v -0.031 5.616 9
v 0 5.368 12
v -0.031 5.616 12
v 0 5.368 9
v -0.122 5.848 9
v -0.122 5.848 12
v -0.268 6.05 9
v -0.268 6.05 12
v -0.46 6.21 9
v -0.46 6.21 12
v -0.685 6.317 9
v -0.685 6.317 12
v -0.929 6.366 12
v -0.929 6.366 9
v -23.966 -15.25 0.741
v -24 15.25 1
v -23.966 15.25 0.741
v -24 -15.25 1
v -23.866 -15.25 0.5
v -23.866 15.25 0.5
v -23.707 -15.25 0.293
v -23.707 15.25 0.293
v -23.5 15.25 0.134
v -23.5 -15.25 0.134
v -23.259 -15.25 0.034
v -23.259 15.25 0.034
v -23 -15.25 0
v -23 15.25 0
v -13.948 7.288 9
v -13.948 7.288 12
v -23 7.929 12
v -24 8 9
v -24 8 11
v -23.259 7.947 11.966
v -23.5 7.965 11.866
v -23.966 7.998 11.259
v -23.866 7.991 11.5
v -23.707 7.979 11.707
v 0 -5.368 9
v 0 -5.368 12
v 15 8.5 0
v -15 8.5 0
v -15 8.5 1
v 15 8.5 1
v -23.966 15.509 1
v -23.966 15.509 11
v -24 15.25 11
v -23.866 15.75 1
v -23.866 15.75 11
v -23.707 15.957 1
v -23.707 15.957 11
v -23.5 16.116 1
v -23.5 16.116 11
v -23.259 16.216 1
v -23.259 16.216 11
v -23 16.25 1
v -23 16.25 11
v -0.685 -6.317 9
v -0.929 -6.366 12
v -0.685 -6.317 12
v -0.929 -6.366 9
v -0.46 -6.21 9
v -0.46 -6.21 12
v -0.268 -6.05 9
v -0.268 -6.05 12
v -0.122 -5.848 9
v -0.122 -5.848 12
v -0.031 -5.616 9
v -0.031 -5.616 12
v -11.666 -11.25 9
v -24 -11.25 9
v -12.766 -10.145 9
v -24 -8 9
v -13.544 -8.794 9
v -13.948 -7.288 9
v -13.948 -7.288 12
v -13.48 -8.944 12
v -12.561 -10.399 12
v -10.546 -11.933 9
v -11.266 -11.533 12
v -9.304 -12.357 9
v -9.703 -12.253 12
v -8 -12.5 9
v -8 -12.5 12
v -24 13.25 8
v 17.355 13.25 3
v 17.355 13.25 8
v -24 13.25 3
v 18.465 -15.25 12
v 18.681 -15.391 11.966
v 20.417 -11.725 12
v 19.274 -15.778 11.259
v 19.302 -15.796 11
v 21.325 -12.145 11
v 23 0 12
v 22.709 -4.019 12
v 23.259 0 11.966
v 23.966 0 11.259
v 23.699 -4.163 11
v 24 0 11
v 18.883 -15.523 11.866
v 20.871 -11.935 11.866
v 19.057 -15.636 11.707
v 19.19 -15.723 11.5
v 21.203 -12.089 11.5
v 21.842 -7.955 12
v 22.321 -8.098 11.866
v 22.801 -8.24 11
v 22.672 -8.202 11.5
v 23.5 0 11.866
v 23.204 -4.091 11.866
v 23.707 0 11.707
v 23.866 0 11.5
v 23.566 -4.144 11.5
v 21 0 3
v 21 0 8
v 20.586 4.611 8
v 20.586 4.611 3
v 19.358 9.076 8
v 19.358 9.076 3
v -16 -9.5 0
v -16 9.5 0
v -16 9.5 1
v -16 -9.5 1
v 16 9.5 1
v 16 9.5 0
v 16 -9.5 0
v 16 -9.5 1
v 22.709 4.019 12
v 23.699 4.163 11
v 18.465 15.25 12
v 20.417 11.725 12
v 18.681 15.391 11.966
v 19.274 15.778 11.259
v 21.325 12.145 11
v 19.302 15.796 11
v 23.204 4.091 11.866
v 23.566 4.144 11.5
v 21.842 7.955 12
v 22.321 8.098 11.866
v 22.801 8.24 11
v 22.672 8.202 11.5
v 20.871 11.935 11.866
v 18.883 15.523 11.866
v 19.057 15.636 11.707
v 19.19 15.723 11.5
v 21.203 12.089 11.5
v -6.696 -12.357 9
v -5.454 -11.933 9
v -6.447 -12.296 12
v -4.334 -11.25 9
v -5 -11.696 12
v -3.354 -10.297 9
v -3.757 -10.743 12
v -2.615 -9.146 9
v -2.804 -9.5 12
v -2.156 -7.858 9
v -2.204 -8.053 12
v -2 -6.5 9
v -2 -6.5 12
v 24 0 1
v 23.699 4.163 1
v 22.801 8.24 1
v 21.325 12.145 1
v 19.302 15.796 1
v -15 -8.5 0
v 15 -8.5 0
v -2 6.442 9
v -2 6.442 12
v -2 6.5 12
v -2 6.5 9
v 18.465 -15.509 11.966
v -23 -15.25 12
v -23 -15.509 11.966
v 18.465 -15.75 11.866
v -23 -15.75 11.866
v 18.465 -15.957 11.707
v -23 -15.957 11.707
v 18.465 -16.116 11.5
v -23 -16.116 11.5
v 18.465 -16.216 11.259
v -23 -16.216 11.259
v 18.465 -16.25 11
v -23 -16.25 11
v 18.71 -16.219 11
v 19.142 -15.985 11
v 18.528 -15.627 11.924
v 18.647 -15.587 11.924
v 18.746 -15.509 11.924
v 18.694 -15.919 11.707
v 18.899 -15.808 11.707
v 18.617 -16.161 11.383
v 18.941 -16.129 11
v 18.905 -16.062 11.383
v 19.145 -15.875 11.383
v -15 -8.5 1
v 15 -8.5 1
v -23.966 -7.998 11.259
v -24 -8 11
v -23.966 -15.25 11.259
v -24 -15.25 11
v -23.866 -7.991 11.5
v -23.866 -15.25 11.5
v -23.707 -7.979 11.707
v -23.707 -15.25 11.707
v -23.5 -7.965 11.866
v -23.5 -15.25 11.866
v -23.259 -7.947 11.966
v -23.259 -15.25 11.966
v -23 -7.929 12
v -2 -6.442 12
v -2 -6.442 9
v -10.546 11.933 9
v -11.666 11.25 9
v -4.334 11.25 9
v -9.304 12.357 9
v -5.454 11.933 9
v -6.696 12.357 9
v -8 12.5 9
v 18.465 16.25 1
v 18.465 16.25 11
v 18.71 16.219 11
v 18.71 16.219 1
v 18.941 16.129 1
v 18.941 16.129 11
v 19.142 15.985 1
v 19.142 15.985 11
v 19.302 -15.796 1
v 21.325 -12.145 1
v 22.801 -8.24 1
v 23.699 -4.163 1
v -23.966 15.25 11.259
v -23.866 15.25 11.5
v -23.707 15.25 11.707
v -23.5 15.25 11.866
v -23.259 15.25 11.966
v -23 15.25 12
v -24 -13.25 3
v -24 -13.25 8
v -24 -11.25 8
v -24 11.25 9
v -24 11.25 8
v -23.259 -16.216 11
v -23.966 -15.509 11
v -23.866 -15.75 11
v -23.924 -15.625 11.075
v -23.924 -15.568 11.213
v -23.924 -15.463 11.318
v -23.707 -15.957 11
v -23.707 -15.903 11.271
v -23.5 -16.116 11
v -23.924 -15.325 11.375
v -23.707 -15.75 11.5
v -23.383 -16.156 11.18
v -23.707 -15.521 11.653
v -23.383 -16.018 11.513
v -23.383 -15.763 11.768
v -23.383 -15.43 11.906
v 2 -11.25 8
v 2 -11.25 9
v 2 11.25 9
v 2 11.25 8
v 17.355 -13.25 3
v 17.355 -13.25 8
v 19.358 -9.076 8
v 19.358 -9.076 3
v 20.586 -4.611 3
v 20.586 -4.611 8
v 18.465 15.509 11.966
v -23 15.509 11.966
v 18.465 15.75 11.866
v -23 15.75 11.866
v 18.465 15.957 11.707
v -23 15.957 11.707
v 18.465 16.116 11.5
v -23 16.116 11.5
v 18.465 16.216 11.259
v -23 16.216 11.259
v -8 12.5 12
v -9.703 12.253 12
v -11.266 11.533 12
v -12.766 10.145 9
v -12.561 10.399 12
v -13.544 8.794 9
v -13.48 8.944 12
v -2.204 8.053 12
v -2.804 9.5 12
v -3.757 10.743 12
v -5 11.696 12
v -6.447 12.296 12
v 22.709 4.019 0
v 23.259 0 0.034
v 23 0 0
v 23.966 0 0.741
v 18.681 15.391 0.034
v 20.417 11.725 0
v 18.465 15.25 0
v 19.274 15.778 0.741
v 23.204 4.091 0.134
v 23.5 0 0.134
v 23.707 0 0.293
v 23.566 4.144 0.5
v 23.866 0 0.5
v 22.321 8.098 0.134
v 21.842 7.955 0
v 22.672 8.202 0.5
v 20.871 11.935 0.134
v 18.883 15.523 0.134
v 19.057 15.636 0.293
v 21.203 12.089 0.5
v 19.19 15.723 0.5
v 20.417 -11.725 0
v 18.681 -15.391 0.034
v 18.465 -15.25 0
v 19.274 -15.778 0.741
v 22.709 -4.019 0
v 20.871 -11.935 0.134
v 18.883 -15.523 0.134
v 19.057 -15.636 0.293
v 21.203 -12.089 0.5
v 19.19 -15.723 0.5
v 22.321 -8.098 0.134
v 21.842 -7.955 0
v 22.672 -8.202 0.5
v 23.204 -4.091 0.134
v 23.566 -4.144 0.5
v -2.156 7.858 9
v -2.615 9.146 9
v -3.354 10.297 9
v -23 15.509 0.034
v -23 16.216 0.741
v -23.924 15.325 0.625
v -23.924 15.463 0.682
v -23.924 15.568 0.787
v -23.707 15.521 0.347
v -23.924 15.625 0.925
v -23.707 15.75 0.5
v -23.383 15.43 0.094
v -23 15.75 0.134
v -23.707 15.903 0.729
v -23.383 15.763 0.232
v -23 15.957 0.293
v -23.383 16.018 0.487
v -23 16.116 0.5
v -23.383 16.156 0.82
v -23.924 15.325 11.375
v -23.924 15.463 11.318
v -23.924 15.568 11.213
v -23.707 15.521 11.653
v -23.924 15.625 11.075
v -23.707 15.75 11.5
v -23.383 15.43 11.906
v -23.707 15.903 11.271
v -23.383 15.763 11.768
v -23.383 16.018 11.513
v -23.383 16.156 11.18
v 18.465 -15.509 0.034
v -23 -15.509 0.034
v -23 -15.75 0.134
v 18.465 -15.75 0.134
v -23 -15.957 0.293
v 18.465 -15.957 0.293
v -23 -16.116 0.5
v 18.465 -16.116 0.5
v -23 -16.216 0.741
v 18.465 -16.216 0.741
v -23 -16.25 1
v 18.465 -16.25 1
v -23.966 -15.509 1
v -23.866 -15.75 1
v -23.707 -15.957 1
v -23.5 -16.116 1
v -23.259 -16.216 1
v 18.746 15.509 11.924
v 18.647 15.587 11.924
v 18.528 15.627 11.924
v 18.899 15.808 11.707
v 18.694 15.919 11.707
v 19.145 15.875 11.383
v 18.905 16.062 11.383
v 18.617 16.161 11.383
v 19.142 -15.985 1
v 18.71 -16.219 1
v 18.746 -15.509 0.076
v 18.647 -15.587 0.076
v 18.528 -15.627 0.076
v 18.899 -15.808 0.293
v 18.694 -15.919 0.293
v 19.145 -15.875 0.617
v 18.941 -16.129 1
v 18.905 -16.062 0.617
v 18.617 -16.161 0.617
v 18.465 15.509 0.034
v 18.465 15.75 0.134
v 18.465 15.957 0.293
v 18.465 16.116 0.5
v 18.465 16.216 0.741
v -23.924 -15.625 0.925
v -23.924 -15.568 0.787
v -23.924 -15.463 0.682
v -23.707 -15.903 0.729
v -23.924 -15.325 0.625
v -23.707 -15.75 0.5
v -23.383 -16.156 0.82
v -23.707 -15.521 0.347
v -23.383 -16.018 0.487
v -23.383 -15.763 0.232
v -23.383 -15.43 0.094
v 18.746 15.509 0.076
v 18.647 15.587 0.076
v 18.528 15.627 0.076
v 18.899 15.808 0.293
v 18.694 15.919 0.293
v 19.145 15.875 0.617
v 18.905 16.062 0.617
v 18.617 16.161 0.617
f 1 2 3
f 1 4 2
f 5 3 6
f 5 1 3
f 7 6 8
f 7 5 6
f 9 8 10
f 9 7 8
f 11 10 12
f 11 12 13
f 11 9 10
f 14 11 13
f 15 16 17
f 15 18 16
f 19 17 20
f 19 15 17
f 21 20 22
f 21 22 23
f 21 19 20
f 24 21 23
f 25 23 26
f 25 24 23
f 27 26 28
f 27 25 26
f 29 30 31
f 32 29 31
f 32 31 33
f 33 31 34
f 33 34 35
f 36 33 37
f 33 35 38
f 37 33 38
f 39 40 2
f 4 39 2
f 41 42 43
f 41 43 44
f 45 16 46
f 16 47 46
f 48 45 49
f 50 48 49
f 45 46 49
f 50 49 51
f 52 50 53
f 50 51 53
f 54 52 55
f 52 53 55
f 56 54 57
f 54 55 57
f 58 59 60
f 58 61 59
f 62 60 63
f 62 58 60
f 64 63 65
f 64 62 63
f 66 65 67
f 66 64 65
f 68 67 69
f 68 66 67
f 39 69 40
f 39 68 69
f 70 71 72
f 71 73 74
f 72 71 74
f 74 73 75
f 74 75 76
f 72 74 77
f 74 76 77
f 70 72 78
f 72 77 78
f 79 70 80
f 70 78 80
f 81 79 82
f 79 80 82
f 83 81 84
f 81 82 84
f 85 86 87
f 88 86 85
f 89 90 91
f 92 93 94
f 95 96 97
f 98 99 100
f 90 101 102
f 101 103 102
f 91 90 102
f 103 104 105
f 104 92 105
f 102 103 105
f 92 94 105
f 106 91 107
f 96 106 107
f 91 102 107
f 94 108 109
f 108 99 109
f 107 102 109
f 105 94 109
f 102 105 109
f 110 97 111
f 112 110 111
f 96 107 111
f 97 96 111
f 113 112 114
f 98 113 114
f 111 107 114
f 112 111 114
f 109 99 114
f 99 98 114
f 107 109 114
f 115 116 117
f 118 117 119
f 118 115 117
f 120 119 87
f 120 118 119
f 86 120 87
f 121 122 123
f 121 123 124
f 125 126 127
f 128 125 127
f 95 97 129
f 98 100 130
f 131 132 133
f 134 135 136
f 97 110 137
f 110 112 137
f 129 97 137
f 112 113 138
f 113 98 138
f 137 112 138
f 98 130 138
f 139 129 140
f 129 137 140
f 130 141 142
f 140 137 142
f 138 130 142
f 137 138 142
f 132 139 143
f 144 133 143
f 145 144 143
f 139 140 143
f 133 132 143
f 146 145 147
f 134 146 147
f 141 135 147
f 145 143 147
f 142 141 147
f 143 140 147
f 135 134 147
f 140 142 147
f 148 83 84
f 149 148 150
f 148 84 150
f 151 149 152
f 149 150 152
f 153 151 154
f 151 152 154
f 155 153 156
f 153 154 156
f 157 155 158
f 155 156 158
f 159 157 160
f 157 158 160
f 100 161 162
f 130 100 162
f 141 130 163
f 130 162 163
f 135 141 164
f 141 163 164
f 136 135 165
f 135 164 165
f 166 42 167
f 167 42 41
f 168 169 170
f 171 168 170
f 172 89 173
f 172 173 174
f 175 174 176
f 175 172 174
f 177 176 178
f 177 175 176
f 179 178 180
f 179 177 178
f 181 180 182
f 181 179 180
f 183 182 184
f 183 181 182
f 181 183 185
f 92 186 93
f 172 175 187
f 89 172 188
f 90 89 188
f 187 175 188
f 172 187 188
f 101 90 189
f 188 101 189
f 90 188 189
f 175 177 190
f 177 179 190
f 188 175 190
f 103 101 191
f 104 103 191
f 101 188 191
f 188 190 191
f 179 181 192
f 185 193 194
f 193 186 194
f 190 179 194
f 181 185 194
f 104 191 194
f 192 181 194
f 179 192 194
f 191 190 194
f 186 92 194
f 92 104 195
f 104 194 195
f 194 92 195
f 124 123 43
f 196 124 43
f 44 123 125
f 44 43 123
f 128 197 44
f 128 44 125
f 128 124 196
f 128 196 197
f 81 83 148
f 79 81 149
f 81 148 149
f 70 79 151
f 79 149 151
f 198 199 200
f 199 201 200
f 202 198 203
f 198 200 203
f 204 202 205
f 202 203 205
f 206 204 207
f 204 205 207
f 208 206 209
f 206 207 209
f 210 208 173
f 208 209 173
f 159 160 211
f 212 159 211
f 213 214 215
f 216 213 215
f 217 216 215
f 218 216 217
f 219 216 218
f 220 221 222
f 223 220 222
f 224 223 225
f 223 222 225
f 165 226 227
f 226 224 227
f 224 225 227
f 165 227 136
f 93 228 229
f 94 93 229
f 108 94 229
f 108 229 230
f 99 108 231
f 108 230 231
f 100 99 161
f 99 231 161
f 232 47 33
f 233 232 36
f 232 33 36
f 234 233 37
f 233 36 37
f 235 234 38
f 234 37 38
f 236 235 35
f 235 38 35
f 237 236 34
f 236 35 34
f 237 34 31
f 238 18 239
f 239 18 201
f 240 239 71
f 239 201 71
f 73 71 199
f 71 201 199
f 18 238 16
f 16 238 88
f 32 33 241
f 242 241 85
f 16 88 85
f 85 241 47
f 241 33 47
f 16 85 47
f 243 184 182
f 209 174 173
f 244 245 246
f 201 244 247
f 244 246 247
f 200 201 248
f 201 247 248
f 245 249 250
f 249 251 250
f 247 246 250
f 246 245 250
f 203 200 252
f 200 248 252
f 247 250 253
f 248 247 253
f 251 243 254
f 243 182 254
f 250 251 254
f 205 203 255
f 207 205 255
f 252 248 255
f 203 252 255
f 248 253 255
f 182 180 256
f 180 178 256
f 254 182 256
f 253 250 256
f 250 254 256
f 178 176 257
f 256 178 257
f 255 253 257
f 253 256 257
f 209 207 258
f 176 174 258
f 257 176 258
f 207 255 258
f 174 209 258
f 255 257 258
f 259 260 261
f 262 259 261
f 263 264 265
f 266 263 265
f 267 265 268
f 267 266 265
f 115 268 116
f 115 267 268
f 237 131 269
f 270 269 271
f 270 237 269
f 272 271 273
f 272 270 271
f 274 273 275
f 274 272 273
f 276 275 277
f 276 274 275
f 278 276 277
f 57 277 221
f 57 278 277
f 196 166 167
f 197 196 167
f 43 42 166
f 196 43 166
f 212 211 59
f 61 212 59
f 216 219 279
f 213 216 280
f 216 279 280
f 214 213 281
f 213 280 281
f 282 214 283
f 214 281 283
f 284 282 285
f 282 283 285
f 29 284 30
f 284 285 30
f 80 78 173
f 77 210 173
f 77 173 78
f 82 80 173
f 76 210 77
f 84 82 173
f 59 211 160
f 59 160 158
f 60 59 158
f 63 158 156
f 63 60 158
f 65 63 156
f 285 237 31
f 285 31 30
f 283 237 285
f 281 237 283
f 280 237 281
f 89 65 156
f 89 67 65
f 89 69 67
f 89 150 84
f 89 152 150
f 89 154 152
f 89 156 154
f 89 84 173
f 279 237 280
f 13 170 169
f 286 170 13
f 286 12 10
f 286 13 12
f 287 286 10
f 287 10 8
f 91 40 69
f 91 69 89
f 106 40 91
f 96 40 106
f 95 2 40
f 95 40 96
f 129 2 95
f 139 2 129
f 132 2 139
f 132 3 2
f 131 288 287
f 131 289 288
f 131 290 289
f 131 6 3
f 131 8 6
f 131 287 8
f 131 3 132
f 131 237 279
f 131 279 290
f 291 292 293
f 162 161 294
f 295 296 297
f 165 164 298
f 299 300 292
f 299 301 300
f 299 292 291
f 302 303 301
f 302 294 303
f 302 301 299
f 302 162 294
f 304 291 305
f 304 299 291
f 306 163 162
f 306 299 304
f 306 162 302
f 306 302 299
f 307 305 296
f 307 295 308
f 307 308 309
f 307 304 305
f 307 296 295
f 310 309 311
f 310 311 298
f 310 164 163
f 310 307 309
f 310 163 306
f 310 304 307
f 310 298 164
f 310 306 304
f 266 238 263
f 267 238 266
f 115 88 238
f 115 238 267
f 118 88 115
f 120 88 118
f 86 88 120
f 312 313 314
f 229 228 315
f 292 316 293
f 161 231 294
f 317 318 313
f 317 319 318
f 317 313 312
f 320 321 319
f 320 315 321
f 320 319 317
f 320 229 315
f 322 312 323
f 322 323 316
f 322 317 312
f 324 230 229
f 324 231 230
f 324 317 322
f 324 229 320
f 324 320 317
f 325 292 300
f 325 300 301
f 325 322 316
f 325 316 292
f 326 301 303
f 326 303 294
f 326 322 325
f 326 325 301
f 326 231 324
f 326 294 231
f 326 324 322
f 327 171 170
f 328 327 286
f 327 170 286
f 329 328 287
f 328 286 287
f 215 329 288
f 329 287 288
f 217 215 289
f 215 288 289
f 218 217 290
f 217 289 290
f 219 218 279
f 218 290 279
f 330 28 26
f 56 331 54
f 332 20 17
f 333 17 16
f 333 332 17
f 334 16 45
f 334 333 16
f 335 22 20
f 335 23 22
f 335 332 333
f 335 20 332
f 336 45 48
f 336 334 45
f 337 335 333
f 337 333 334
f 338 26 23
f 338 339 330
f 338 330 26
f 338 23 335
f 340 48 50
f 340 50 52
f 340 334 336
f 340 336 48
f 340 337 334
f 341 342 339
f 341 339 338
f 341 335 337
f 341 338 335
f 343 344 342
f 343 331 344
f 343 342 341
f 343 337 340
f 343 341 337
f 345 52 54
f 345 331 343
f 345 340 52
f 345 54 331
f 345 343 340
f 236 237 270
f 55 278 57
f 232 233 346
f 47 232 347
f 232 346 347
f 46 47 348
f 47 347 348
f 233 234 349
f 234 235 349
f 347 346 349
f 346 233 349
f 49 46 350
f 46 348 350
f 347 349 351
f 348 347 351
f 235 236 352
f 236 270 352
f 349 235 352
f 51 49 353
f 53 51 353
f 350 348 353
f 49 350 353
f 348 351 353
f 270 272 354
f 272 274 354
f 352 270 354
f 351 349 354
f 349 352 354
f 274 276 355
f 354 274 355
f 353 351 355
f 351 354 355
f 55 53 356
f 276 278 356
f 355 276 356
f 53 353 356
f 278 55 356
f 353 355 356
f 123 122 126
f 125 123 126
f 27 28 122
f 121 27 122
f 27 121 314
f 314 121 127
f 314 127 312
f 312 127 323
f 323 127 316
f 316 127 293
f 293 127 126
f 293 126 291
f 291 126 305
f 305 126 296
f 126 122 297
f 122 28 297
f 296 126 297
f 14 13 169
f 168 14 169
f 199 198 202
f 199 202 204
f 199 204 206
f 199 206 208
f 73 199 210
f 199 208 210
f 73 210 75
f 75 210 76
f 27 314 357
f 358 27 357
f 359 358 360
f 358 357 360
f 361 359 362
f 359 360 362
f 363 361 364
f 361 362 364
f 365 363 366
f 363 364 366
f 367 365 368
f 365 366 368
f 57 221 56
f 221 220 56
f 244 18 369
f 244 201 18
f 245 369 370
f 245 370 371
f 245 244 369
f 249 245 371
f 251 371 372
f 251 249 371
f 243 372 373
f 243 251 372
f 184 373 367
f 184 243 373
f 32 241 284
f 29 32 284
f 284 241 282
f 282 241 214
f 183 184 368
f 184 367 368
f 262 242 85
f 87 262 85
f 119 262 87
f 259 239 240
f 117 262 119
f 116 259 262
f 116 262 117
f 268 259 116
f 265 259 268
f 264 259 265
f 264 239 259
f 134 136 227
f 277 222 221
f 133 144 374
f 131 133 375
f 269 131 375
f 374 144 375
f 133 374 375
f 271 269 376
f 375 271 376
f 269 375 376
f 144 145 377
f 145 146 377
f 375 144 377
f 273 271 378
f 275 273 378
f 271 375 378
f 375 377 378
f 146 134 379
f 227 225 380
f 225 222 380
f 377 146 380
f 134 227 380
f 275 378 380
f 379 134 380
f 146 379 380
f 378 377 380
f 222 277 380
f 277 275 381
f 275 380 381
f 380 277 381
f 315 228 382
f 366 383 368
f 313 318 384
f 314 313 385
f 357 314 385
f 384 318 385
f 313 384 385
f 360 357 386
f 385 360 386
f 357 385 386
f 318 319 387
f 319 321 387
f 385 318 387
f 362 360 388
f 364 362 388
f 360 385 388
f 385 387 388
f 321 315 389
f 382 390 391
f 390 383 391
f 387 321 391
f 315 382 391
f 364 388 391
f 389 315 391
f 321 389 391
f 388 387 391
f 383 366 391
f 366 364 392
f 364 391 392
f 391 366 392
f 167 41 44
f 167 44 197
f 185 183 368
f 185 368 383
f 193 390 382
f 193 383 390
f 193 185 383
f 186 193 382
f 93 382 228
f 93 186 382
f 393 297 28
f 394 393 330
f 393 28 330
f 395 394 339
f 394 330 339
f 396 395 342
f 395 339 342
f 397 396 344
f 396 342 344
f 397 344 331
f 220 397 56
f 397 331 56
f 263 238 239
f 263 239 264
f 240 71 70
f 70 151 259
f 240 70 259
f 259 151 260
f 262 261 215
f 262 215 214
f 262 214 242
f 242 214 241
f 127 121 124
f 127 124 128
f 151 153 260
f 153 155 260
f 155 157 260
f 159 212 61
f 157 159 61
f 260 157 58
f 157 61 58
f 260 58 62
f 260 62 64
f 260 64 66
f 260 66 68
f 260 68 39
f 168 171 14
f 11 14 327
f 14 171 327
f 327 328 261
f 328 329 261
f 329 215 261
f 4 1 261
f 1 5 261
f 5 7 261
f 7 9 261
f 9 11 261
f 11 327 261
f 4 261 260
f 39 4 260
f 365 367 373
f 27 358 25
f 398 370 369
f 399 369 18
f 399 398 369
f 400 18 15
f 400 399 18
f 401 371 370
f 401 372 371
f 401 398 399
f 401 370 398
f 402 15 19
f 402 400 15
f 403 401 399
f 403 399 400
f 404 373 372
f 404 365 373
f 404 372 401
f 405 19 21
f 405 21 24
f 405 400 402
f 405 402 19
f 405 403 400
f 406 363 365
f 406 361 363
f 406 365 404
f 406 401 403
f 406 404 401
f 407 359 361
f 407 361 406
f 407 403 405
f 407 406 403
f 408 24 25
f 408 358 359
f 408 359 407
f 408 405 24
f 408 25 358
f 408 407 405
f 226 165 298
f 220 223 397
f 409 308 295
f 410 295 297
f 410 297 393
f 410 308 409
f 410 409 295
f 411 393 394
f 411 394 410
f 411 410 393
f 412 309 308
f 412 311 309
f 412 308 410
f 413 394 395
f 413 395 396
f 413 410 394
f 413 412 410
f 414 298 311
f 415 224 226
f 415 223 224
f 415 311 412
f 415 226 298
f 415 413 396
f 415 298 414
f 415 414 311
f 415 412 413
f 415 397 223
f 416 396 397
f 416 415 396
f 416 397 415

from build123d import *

# Parameters (mm, degrees)
F1_DEPTH = 12
F2_T     = -3
F4_DEPTH = 3
F5_R     = 1
F6_W     = 32
F6_H     = 19
F6_W_2   = 30
F6_H_2   = 17
F7_DEPTH = 1
F9_DEPTH = 1
F10_R    = 1


with BuildPart() as f1:
    # F0 (on Top) → F1 (new body)
    with BuildSketch(Plane.XY):
        with BuildLine():
            Line((-24, -16.25), (19, -16.25))
            ThreePointArc((19, -16.25), (22.7217369359, -8.5009191815), (24, -2.376e-07))
            ThreePointArc((24, -2.376e-07), (22.7217370058, 8.5009189544), (19, 16.25))
            Line((19, 16.25), (-24, 16.25))
            Line((-24, 16.25), (-24, -16.25))
        make_face()
    extrude(amount=F1_DEPTH)

    # F2
    f2_openings = [f1.faces().sort_by_distance(p)[0] for p in [
        (-24, 0, 6),
    ]]
    offset(amount=F2_T, openings=f2_openings)

    # F3 (on face) → F4 (cut, through all)
    with BuildSketch(Plane.XY.offset(12)):
        with BuildLine():
            ThreePointArc((-8, 12.5), (-11.9542437084, 11.0126440912), (-13.9480315021, 7.2879855647))
            Line((-13.9480315021, 7.2879855647), (-2, 6.4416666667))
            Line((-2, 6.4416666667), (-2, 6.5))
            ThreePointArc((-2, 6.5), (-3.7573593129, 10.7426406871), (-8, 12.5))
        make_face()
        with BuildLine():
            Line((-2, 6.4416666667), (-13.9480315021, 7.2879855647))
            ThreePointArc((-13.9480315021, 7.2879855647), (-13.9869937787, 6.8948486973), (-14, 6.5))
            Line((-14, 6.5), (-14, -6.5))
            ThreePointArc((-14, -6.5), (-13.9869937787, -6.8948486973), (-13.9480315021, -7.2879855647))
            Line((-13.9480315021, -7.2879855647), (-2, -6.4416666667))
            Line((-2, -6.4416666667), (-2, 6.4416666667))
        make_face()
        with BuildLine():
            Line((-2, -6.4416666667), (-13.9480315021, -7.2879855647))
            ThreePointArc((-13.9480315021, -7.2879855647), (-11.9542437084, -11.0126440912), (-8, -12.5))
            ThreePointArc((-8, -12.5), (-3.7573593129, -10.7426406871), (-2, -6.5))
            Line((-2, -6.5), (-2, -6.4416666667))
        make_face()
        with BuildLine():
            Line((-13.9480315021, 7.2879855647), (-24, 8))
            Line((-24, 8), (-24, -8))
            Line((-24, -8), (-13.9480315021, -7.2879855647))
            ThreePointArc((-13.9480315021, -7.2879855647), (-13.9869937787, -6.8948486973), (-14, -6.5))
            Line((-14, -6.5), (-14, 6.5))
            ThreePointArc((-14, 6.5), (-13.9869937787, 6.8948486973), (-13.9480315021, 7.2879855647))
        make_face()
        Polygon((0, 6.3), (-2, 6.4416666667), (-2, -6.4416666667), (0, -6.3), (0, 0), align=None)
    extrude(amount=-F4_DEPTH, mode=Mode.SUBTRACT)

    # F5
    f5_edges = [f1.edges().sort_by_distance(p)[0] for p in [
        (0, 6.3, 10.5),
        (0, -6.3, 10.5),
    ]]
    fillet(f5_edges, radius=F5_R)

    # F6 (on face) → F7 (cut)
    with BuildSketch(Plane(origin=(0, 0, 0), x_dir=(1, 0, 0), z_dir=(0, 0, -1))):
        Rectangle(F6_W, F6_H)
        Rectangle(F6_W_2, F6_H_2, mode=Mode.SUBTRACT)
    extrude(amount=-F7_DEPTH, mode=Mode.SUBTRACT)

    # F8 (on face) → F9 (join)
    with BuildSketch(Plane(origin=(0, 0, 9), x_dir=(1, 0, 0), z_dir=(0, 0, -1))):
        with BuildLine():
            ThreePointArc((-4.3342804253, 11.25), (-8, 12.5), (-11.6657195747, 11.25))
            Line((-11.6657195747, 11.25), (-4.3342804253, 11.25))
        make_face()
        with BuildLine():
            Line((-4.3342804253, -11.25), (-11.6657195747, -11.25))
            ThreePointArc((-11.6657195747, -11.25), (-8, -12.5), (-4.3342804253, -11.25))
        make_face()
        with BuildLine():
            Line((-24, -11.25), (-24, -13.25))
            Line((-24, -13.25), (17.355180526, -13.25))
            ThreePointArc((17.355180526, -13.25), (21, 0), (17.355180526, 13.25))
            Line((17.355180526, 13.25), (-24, 13.25))
            Line((-24, 13.25), (-24, 11.25))
            Line((-24, 11.25), (-11.6657195747, 11.25))
            ThreePointArc((-11.6657195747, 11.25), (-8, 12.5), (-4.3342804253, 11.25))
            Line((-4.3342804253, 11.25), (2, 11.25))
            Line((2, 11.25), (2, -11.25))
            Line((2, -11.25), (-4.3342804253, -11.25))
            ThreePointArc((-4.3342804253, -11.25), (-8, -12.5), (-11.6657195747, -11.25))
            Line((-11.6657195747, -11.25), (-24, -11.25))
        make_face()
    extrude(amount=F9_DEPTH)

    # F10
    f10_edges = [f1.edges().sort_by_distance(p)[0] for p in [
        (-2.5, -16.25, 12),
        (24, 0, 12),
        (-2.5, 16.25, 12),
        (19, -16.25, 6),
        (19, 16.25, 6),
        (24, 0, 0),
        (-2.5, 16.25, 0),
        (-2.5, -16.25, 0),
        (-24, -16.25, 6),
        (-24, -12.125, 12),
        (-24, 0, 0),
        (-24, 12.125, 12),
        (-24, 16.25, 6),
    ]]
    fillet(f10_edges, radius=F10_R)


solid = f1.part
